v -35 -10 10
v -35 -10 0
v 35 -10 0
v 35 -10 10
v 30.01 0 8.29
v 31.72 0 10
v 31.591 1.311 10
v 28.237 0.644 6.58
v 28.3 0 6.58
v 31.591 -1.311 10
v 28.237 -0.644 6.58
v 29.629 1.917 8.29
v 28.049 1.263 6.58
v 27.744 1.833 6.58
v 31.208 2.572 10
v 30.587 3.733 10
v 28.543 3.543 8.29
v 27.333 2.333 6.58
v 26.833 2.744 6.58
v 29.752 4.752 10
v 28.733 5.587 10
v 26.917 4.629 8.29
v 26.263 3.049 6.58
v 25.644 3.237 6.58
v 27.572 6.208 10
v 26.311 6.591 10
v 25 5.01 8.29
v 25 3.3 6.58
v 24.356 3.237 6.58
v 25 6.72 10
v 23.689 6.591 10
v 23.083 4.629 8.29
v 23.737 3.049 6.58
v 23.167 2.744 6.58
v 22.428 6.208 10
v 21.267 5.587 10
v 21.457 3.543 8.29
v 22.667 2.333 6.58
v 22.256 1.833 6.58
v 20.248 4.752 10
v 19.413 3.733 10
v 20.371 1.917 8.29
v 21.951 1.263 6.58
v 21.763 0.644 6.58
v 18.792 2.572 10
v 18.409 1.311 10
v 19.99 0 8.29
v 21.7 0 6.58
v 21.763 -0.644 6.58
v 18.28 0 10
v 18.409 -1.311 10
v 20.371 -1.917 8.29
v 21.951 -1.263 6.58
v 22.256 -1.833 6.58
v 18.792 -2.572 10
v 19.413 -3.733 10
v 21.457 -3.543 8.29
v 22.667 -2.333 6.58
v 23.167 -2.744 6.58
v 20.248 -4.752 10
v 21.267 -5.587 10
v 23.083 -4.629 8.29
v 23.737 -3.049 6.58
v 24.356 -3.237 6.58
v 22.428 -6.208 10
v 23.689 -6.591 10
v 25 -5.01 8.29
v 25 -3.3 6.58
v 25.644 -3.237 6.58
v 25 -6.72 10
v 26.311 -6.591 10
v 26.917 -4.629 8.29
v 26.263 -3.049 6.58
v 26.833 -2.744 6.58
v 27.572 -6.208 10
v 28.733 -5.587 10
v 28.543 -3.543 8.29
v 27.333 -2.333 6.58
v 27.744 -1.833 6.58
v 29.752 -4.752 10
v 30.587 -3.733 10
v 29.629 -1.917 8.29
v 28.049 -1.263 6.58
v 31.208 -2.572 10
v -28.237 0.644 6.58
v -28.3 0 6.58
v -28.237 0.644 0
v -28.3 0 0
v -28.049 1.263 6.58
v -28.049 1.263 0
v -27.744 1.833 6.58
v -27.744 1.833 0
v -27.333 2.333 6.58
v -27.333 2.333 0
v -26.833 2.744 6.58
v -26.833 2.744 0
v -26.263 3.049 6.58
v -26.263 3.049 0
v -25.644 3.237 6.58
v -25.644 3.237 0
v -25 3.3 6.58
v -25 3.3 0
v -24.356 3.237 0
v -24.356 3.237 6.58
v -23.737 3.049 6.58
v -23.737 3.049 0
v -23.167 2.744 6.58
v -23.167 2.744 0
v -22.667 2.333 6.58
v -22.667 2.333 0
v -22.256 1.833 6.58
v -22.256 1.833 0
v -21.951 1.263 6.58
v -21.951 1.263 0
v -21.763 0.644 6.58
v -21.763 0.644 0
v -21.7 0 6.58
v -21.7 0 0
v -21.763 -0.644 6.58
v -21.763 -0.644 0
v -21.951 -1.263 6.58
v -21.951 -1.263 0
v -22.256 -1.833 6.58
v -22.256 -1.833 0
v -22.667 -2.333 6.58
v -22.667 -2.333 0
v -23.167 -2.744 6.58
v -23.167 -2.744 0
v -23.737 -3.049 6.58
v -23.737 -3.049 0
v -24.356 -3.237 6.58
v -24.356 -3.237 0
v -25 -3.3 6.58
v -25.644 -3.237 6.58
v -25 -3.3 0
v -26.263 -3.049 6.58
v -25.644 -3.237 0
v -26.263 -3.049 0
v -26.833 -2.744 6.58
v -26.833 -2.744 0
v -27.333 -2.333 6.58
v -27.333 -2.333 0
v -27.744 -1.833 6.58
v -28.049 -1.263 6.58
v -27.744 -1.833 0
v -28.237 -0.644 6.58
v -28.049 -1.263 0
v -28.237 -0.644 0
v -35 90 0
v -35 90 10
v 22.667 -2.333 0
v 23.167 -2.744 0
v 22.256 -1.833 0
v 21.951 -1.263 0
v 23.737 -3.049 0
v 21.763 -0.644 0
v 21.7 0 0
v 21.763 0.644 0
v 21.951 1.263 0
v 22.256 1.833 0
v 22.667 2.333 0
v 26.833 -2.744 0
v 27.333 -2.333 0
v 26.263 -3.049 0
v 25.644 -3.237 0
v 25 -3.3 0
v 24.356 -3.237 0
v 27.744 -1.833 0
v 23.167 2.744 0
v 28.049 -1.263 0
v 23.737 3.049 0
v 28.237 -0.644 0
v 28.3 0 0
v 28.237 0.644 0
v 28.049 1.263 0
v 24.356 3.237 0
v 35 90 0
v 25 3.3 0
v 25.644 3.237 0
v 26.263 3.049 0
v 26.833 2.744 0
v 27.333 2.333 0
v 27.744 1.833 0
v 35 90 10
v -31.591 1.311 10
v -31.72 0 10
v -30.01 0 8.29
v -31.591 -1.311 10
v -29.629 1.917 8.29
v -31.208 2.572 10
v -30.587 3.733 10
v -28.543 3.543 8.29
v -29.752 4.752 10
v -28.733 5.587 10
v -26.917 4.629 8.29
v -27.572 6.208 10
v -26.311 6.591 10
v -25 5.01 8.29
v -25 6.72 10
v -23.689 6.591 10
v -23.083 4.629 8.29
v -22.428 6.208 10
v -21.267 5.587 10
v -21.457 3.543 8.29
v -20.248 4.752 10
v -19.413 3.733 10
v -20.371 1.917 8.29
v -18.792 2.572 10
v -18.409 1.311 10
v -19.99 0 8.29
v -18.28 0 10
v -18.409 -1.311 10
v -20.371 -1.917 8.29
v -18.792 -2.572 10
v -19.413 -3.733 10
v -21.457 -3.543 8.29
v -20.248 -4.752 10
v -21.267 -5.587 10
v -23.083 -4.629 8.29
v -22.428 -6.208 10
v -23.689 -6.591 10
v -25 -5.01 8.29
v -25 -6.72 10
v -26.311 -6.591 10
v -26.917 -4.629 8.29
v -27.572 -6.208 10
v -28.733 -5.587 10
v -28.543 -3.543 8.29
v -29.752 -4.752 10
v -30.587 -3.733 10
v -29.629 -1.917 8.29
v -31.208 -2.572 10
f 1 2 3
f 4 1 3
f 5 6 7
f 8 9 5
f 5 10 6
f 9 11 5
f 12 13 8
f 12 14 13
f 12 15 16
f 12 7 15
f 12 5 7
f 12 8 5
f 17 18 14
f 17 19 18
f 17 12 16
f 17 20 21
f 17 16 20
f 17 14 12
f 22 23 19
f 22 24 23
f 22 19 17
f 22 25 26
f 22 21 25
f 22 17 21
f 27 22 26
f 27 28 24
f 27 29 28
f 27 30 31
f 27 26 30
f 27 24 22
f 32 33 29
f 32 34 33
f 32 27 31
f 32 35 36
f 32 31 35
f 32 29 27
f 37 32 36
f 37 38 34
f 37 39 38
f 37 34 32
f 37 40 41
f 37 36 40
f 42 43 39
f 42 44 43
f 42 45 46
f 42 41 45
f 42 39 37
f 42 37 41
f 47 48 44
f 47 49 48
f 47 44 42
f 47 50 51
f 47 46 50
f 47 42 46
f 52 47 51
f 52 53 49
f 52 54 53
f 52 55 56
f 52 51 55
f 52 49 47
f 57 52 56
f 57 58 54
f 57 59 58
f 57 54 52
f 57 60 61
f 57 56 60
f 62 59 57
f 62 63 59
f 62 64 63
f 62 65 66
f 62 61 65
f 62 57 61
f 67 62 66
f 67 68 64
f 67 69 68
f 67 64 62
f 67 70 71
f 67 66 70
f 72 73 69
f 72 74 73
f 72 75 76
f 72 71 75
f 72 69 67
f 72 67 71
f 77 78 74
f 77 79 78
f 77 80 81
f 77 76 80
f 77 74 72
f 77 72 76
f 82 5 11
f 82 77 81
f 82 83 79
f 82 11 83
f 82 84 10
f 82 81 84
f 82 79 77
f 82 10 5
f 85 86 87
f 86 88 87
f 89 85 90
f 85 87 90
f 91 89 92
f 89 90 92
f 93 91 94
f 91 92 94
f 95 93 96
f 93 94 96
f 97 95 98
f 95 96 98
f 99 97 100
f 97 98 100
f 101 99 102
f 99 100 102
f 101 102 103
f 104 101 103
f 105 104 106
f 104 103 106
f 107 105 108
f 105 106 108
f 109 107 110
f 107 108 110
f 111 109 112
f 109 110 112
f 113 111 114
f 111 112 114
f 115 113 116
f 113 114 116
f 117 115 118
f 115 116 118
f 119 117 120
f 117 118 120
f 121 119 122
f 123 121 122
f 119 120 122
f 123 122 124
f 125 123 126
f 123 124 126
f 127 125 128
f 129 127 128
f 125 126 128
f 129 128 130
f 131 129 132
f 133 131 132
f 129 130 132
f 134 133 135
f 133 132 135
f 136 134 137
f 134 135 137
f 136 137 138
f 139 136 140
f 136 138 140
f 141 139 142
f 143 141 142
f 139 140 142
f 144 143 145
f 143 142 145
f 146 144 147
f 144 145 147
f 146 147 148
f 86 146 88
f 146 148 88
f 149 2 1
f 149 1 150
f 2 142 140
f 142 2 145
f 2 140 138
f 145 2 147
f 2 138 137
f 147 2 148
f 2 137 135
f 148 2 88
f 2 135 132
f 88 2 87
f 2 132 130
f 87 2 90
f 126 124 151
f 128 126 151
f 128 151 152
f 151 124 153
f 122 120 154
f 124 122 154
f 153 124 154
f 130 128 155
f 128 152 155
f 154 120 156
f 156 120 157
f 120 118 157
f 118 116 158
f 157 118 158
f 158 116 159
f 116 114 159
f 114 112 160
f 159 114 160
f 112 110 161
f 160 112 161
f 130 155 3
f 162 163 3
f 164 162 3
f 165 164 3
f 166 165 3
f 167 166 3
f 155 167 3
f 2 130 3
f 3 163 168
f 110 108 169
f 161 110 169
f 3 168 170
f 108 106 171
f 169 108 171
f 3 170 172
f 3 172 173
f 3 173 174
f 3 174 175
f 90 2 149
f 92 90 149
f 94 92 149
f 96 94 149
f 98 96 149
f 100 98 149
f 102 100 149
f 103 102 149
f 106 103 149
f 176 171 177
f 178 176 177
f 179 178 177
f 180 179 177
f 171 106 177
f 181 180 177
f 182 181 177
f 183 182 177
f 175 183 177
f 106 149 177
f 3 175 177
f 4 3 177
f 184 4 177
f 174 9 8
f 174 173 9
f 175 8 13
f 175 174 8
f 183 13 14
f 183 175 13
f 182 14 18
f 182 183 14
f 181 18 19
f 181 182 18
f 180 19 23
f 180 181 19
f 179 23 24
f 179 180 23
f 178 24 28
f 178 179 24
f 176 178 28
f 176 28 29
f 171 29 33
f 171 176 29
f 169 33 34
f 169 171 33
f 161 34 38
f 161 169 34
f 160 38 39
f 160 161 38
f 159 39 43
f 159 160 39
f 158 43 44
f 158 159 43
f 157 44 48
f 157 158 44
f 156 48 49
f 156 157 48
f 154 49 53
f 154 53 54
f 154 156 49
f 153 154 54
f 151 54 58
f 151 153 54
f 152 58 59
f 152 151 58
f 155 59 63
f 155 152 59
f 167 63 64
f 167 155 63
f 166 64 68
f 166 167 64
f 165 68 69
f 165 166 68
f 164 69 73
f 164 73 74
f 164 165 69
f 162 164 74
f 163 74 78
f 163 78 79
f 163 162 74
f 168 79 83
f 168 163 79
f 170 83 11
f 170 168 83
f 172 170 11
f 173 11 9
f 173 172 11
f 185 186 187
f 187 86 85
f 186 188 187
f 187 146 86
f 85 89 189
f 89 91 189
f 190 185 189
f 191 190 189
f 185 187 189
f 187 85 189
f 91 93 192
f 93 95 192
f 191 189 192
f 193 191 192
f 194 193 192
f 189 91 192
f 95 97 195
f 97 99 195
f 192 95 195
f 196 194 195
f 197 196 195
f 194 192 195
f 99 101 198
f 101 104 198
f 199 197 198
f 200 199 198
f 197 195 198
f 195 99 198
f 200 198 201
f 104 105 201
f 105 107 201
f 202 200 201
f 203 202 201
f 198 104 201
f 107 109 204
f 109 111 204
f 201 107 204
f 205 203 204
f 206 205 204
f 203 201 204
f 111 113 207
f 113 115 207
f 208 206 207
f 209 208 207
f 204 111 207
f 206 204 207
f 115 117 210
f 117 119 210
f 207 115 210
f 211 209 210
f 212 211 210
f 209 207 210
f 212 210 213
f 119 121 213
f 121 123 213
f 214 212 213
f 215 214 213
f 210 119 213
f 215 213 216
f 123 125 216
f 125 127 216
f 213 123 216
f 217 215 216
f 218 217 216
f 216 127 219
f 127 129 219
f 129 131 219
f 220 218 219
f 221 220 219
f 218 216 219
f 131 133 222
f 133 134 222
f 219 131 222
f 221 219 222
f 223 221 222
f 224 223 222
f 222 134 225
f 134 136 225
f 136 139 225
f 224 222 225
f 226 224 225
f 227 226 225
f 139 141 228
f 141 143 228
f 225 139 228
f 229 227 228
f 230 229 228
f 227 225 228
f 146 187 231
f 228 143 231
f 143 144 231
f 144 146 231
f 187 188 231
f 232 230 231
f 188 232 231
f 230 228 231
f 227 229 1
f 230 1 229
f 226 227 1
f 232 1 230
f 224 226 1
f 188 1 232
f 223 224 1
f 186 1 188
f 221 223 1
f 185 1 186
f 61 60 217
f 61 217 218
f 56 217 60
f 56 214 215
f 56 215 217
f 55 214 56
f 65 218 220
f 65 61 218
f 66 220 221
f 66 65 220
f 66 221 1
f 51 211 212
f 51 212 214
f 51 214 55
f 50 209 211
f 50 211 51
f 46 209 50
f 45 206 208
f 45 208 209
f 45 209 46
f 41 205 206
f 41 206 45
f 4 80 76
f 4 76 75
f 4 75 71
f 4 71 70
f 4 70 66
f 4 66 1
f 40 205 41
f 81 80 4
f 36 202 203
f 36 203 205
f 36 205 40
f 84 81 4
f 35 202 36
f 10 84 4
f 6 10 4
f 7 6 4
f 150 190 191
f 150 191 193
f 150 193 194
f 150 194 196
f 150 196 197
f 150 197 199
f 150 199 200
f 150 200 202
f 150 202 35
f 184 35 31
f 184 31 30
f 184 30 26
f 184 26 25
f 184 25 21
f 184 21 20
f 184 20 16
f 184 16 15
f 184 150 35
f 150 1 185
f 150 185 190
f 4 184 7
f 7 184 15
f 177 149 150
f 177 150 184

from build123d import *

# Parameters (mm, degrees)
F0_W           = 70
F0_H           = 100
F1_DEPTH       = 10
F3_D           = 6.6
F3_CSINK_D     = 13.44
F3_CSINK_ANGLE = 90


# Not quite as in the source:
# - a pattern or mirror of a feature is missing from the dataset's text; its kind, count and spacing are read off the source's solid


with BuildPart() as f1:
    # F0 (on Top) → F1 (new body)
    with BuildSketch(Plane.XY):
        with Locations((0, 40)):
            Rectangle(F0_W, F0_H)
    extrude(amount=F1_DEPTH)

    # F3 (through all)
    with Locations(Plane.XY.offset(10)):
        with Locations((-25, 0)):
            f3 = CounterSinkHole(F3_D / 2, F3_CSINK_D / 2, counter_sink_angle=F3_CSINK_ANGLE)

    # F3_copies: F3 across plane
    add(f3.mirror(Plane(origin=(0, 0, 0), x_dir=(0, 0, 1), z_dir=(1, 0, 0))), mode=Mode.SUBTRACT)


solid = f1.part
